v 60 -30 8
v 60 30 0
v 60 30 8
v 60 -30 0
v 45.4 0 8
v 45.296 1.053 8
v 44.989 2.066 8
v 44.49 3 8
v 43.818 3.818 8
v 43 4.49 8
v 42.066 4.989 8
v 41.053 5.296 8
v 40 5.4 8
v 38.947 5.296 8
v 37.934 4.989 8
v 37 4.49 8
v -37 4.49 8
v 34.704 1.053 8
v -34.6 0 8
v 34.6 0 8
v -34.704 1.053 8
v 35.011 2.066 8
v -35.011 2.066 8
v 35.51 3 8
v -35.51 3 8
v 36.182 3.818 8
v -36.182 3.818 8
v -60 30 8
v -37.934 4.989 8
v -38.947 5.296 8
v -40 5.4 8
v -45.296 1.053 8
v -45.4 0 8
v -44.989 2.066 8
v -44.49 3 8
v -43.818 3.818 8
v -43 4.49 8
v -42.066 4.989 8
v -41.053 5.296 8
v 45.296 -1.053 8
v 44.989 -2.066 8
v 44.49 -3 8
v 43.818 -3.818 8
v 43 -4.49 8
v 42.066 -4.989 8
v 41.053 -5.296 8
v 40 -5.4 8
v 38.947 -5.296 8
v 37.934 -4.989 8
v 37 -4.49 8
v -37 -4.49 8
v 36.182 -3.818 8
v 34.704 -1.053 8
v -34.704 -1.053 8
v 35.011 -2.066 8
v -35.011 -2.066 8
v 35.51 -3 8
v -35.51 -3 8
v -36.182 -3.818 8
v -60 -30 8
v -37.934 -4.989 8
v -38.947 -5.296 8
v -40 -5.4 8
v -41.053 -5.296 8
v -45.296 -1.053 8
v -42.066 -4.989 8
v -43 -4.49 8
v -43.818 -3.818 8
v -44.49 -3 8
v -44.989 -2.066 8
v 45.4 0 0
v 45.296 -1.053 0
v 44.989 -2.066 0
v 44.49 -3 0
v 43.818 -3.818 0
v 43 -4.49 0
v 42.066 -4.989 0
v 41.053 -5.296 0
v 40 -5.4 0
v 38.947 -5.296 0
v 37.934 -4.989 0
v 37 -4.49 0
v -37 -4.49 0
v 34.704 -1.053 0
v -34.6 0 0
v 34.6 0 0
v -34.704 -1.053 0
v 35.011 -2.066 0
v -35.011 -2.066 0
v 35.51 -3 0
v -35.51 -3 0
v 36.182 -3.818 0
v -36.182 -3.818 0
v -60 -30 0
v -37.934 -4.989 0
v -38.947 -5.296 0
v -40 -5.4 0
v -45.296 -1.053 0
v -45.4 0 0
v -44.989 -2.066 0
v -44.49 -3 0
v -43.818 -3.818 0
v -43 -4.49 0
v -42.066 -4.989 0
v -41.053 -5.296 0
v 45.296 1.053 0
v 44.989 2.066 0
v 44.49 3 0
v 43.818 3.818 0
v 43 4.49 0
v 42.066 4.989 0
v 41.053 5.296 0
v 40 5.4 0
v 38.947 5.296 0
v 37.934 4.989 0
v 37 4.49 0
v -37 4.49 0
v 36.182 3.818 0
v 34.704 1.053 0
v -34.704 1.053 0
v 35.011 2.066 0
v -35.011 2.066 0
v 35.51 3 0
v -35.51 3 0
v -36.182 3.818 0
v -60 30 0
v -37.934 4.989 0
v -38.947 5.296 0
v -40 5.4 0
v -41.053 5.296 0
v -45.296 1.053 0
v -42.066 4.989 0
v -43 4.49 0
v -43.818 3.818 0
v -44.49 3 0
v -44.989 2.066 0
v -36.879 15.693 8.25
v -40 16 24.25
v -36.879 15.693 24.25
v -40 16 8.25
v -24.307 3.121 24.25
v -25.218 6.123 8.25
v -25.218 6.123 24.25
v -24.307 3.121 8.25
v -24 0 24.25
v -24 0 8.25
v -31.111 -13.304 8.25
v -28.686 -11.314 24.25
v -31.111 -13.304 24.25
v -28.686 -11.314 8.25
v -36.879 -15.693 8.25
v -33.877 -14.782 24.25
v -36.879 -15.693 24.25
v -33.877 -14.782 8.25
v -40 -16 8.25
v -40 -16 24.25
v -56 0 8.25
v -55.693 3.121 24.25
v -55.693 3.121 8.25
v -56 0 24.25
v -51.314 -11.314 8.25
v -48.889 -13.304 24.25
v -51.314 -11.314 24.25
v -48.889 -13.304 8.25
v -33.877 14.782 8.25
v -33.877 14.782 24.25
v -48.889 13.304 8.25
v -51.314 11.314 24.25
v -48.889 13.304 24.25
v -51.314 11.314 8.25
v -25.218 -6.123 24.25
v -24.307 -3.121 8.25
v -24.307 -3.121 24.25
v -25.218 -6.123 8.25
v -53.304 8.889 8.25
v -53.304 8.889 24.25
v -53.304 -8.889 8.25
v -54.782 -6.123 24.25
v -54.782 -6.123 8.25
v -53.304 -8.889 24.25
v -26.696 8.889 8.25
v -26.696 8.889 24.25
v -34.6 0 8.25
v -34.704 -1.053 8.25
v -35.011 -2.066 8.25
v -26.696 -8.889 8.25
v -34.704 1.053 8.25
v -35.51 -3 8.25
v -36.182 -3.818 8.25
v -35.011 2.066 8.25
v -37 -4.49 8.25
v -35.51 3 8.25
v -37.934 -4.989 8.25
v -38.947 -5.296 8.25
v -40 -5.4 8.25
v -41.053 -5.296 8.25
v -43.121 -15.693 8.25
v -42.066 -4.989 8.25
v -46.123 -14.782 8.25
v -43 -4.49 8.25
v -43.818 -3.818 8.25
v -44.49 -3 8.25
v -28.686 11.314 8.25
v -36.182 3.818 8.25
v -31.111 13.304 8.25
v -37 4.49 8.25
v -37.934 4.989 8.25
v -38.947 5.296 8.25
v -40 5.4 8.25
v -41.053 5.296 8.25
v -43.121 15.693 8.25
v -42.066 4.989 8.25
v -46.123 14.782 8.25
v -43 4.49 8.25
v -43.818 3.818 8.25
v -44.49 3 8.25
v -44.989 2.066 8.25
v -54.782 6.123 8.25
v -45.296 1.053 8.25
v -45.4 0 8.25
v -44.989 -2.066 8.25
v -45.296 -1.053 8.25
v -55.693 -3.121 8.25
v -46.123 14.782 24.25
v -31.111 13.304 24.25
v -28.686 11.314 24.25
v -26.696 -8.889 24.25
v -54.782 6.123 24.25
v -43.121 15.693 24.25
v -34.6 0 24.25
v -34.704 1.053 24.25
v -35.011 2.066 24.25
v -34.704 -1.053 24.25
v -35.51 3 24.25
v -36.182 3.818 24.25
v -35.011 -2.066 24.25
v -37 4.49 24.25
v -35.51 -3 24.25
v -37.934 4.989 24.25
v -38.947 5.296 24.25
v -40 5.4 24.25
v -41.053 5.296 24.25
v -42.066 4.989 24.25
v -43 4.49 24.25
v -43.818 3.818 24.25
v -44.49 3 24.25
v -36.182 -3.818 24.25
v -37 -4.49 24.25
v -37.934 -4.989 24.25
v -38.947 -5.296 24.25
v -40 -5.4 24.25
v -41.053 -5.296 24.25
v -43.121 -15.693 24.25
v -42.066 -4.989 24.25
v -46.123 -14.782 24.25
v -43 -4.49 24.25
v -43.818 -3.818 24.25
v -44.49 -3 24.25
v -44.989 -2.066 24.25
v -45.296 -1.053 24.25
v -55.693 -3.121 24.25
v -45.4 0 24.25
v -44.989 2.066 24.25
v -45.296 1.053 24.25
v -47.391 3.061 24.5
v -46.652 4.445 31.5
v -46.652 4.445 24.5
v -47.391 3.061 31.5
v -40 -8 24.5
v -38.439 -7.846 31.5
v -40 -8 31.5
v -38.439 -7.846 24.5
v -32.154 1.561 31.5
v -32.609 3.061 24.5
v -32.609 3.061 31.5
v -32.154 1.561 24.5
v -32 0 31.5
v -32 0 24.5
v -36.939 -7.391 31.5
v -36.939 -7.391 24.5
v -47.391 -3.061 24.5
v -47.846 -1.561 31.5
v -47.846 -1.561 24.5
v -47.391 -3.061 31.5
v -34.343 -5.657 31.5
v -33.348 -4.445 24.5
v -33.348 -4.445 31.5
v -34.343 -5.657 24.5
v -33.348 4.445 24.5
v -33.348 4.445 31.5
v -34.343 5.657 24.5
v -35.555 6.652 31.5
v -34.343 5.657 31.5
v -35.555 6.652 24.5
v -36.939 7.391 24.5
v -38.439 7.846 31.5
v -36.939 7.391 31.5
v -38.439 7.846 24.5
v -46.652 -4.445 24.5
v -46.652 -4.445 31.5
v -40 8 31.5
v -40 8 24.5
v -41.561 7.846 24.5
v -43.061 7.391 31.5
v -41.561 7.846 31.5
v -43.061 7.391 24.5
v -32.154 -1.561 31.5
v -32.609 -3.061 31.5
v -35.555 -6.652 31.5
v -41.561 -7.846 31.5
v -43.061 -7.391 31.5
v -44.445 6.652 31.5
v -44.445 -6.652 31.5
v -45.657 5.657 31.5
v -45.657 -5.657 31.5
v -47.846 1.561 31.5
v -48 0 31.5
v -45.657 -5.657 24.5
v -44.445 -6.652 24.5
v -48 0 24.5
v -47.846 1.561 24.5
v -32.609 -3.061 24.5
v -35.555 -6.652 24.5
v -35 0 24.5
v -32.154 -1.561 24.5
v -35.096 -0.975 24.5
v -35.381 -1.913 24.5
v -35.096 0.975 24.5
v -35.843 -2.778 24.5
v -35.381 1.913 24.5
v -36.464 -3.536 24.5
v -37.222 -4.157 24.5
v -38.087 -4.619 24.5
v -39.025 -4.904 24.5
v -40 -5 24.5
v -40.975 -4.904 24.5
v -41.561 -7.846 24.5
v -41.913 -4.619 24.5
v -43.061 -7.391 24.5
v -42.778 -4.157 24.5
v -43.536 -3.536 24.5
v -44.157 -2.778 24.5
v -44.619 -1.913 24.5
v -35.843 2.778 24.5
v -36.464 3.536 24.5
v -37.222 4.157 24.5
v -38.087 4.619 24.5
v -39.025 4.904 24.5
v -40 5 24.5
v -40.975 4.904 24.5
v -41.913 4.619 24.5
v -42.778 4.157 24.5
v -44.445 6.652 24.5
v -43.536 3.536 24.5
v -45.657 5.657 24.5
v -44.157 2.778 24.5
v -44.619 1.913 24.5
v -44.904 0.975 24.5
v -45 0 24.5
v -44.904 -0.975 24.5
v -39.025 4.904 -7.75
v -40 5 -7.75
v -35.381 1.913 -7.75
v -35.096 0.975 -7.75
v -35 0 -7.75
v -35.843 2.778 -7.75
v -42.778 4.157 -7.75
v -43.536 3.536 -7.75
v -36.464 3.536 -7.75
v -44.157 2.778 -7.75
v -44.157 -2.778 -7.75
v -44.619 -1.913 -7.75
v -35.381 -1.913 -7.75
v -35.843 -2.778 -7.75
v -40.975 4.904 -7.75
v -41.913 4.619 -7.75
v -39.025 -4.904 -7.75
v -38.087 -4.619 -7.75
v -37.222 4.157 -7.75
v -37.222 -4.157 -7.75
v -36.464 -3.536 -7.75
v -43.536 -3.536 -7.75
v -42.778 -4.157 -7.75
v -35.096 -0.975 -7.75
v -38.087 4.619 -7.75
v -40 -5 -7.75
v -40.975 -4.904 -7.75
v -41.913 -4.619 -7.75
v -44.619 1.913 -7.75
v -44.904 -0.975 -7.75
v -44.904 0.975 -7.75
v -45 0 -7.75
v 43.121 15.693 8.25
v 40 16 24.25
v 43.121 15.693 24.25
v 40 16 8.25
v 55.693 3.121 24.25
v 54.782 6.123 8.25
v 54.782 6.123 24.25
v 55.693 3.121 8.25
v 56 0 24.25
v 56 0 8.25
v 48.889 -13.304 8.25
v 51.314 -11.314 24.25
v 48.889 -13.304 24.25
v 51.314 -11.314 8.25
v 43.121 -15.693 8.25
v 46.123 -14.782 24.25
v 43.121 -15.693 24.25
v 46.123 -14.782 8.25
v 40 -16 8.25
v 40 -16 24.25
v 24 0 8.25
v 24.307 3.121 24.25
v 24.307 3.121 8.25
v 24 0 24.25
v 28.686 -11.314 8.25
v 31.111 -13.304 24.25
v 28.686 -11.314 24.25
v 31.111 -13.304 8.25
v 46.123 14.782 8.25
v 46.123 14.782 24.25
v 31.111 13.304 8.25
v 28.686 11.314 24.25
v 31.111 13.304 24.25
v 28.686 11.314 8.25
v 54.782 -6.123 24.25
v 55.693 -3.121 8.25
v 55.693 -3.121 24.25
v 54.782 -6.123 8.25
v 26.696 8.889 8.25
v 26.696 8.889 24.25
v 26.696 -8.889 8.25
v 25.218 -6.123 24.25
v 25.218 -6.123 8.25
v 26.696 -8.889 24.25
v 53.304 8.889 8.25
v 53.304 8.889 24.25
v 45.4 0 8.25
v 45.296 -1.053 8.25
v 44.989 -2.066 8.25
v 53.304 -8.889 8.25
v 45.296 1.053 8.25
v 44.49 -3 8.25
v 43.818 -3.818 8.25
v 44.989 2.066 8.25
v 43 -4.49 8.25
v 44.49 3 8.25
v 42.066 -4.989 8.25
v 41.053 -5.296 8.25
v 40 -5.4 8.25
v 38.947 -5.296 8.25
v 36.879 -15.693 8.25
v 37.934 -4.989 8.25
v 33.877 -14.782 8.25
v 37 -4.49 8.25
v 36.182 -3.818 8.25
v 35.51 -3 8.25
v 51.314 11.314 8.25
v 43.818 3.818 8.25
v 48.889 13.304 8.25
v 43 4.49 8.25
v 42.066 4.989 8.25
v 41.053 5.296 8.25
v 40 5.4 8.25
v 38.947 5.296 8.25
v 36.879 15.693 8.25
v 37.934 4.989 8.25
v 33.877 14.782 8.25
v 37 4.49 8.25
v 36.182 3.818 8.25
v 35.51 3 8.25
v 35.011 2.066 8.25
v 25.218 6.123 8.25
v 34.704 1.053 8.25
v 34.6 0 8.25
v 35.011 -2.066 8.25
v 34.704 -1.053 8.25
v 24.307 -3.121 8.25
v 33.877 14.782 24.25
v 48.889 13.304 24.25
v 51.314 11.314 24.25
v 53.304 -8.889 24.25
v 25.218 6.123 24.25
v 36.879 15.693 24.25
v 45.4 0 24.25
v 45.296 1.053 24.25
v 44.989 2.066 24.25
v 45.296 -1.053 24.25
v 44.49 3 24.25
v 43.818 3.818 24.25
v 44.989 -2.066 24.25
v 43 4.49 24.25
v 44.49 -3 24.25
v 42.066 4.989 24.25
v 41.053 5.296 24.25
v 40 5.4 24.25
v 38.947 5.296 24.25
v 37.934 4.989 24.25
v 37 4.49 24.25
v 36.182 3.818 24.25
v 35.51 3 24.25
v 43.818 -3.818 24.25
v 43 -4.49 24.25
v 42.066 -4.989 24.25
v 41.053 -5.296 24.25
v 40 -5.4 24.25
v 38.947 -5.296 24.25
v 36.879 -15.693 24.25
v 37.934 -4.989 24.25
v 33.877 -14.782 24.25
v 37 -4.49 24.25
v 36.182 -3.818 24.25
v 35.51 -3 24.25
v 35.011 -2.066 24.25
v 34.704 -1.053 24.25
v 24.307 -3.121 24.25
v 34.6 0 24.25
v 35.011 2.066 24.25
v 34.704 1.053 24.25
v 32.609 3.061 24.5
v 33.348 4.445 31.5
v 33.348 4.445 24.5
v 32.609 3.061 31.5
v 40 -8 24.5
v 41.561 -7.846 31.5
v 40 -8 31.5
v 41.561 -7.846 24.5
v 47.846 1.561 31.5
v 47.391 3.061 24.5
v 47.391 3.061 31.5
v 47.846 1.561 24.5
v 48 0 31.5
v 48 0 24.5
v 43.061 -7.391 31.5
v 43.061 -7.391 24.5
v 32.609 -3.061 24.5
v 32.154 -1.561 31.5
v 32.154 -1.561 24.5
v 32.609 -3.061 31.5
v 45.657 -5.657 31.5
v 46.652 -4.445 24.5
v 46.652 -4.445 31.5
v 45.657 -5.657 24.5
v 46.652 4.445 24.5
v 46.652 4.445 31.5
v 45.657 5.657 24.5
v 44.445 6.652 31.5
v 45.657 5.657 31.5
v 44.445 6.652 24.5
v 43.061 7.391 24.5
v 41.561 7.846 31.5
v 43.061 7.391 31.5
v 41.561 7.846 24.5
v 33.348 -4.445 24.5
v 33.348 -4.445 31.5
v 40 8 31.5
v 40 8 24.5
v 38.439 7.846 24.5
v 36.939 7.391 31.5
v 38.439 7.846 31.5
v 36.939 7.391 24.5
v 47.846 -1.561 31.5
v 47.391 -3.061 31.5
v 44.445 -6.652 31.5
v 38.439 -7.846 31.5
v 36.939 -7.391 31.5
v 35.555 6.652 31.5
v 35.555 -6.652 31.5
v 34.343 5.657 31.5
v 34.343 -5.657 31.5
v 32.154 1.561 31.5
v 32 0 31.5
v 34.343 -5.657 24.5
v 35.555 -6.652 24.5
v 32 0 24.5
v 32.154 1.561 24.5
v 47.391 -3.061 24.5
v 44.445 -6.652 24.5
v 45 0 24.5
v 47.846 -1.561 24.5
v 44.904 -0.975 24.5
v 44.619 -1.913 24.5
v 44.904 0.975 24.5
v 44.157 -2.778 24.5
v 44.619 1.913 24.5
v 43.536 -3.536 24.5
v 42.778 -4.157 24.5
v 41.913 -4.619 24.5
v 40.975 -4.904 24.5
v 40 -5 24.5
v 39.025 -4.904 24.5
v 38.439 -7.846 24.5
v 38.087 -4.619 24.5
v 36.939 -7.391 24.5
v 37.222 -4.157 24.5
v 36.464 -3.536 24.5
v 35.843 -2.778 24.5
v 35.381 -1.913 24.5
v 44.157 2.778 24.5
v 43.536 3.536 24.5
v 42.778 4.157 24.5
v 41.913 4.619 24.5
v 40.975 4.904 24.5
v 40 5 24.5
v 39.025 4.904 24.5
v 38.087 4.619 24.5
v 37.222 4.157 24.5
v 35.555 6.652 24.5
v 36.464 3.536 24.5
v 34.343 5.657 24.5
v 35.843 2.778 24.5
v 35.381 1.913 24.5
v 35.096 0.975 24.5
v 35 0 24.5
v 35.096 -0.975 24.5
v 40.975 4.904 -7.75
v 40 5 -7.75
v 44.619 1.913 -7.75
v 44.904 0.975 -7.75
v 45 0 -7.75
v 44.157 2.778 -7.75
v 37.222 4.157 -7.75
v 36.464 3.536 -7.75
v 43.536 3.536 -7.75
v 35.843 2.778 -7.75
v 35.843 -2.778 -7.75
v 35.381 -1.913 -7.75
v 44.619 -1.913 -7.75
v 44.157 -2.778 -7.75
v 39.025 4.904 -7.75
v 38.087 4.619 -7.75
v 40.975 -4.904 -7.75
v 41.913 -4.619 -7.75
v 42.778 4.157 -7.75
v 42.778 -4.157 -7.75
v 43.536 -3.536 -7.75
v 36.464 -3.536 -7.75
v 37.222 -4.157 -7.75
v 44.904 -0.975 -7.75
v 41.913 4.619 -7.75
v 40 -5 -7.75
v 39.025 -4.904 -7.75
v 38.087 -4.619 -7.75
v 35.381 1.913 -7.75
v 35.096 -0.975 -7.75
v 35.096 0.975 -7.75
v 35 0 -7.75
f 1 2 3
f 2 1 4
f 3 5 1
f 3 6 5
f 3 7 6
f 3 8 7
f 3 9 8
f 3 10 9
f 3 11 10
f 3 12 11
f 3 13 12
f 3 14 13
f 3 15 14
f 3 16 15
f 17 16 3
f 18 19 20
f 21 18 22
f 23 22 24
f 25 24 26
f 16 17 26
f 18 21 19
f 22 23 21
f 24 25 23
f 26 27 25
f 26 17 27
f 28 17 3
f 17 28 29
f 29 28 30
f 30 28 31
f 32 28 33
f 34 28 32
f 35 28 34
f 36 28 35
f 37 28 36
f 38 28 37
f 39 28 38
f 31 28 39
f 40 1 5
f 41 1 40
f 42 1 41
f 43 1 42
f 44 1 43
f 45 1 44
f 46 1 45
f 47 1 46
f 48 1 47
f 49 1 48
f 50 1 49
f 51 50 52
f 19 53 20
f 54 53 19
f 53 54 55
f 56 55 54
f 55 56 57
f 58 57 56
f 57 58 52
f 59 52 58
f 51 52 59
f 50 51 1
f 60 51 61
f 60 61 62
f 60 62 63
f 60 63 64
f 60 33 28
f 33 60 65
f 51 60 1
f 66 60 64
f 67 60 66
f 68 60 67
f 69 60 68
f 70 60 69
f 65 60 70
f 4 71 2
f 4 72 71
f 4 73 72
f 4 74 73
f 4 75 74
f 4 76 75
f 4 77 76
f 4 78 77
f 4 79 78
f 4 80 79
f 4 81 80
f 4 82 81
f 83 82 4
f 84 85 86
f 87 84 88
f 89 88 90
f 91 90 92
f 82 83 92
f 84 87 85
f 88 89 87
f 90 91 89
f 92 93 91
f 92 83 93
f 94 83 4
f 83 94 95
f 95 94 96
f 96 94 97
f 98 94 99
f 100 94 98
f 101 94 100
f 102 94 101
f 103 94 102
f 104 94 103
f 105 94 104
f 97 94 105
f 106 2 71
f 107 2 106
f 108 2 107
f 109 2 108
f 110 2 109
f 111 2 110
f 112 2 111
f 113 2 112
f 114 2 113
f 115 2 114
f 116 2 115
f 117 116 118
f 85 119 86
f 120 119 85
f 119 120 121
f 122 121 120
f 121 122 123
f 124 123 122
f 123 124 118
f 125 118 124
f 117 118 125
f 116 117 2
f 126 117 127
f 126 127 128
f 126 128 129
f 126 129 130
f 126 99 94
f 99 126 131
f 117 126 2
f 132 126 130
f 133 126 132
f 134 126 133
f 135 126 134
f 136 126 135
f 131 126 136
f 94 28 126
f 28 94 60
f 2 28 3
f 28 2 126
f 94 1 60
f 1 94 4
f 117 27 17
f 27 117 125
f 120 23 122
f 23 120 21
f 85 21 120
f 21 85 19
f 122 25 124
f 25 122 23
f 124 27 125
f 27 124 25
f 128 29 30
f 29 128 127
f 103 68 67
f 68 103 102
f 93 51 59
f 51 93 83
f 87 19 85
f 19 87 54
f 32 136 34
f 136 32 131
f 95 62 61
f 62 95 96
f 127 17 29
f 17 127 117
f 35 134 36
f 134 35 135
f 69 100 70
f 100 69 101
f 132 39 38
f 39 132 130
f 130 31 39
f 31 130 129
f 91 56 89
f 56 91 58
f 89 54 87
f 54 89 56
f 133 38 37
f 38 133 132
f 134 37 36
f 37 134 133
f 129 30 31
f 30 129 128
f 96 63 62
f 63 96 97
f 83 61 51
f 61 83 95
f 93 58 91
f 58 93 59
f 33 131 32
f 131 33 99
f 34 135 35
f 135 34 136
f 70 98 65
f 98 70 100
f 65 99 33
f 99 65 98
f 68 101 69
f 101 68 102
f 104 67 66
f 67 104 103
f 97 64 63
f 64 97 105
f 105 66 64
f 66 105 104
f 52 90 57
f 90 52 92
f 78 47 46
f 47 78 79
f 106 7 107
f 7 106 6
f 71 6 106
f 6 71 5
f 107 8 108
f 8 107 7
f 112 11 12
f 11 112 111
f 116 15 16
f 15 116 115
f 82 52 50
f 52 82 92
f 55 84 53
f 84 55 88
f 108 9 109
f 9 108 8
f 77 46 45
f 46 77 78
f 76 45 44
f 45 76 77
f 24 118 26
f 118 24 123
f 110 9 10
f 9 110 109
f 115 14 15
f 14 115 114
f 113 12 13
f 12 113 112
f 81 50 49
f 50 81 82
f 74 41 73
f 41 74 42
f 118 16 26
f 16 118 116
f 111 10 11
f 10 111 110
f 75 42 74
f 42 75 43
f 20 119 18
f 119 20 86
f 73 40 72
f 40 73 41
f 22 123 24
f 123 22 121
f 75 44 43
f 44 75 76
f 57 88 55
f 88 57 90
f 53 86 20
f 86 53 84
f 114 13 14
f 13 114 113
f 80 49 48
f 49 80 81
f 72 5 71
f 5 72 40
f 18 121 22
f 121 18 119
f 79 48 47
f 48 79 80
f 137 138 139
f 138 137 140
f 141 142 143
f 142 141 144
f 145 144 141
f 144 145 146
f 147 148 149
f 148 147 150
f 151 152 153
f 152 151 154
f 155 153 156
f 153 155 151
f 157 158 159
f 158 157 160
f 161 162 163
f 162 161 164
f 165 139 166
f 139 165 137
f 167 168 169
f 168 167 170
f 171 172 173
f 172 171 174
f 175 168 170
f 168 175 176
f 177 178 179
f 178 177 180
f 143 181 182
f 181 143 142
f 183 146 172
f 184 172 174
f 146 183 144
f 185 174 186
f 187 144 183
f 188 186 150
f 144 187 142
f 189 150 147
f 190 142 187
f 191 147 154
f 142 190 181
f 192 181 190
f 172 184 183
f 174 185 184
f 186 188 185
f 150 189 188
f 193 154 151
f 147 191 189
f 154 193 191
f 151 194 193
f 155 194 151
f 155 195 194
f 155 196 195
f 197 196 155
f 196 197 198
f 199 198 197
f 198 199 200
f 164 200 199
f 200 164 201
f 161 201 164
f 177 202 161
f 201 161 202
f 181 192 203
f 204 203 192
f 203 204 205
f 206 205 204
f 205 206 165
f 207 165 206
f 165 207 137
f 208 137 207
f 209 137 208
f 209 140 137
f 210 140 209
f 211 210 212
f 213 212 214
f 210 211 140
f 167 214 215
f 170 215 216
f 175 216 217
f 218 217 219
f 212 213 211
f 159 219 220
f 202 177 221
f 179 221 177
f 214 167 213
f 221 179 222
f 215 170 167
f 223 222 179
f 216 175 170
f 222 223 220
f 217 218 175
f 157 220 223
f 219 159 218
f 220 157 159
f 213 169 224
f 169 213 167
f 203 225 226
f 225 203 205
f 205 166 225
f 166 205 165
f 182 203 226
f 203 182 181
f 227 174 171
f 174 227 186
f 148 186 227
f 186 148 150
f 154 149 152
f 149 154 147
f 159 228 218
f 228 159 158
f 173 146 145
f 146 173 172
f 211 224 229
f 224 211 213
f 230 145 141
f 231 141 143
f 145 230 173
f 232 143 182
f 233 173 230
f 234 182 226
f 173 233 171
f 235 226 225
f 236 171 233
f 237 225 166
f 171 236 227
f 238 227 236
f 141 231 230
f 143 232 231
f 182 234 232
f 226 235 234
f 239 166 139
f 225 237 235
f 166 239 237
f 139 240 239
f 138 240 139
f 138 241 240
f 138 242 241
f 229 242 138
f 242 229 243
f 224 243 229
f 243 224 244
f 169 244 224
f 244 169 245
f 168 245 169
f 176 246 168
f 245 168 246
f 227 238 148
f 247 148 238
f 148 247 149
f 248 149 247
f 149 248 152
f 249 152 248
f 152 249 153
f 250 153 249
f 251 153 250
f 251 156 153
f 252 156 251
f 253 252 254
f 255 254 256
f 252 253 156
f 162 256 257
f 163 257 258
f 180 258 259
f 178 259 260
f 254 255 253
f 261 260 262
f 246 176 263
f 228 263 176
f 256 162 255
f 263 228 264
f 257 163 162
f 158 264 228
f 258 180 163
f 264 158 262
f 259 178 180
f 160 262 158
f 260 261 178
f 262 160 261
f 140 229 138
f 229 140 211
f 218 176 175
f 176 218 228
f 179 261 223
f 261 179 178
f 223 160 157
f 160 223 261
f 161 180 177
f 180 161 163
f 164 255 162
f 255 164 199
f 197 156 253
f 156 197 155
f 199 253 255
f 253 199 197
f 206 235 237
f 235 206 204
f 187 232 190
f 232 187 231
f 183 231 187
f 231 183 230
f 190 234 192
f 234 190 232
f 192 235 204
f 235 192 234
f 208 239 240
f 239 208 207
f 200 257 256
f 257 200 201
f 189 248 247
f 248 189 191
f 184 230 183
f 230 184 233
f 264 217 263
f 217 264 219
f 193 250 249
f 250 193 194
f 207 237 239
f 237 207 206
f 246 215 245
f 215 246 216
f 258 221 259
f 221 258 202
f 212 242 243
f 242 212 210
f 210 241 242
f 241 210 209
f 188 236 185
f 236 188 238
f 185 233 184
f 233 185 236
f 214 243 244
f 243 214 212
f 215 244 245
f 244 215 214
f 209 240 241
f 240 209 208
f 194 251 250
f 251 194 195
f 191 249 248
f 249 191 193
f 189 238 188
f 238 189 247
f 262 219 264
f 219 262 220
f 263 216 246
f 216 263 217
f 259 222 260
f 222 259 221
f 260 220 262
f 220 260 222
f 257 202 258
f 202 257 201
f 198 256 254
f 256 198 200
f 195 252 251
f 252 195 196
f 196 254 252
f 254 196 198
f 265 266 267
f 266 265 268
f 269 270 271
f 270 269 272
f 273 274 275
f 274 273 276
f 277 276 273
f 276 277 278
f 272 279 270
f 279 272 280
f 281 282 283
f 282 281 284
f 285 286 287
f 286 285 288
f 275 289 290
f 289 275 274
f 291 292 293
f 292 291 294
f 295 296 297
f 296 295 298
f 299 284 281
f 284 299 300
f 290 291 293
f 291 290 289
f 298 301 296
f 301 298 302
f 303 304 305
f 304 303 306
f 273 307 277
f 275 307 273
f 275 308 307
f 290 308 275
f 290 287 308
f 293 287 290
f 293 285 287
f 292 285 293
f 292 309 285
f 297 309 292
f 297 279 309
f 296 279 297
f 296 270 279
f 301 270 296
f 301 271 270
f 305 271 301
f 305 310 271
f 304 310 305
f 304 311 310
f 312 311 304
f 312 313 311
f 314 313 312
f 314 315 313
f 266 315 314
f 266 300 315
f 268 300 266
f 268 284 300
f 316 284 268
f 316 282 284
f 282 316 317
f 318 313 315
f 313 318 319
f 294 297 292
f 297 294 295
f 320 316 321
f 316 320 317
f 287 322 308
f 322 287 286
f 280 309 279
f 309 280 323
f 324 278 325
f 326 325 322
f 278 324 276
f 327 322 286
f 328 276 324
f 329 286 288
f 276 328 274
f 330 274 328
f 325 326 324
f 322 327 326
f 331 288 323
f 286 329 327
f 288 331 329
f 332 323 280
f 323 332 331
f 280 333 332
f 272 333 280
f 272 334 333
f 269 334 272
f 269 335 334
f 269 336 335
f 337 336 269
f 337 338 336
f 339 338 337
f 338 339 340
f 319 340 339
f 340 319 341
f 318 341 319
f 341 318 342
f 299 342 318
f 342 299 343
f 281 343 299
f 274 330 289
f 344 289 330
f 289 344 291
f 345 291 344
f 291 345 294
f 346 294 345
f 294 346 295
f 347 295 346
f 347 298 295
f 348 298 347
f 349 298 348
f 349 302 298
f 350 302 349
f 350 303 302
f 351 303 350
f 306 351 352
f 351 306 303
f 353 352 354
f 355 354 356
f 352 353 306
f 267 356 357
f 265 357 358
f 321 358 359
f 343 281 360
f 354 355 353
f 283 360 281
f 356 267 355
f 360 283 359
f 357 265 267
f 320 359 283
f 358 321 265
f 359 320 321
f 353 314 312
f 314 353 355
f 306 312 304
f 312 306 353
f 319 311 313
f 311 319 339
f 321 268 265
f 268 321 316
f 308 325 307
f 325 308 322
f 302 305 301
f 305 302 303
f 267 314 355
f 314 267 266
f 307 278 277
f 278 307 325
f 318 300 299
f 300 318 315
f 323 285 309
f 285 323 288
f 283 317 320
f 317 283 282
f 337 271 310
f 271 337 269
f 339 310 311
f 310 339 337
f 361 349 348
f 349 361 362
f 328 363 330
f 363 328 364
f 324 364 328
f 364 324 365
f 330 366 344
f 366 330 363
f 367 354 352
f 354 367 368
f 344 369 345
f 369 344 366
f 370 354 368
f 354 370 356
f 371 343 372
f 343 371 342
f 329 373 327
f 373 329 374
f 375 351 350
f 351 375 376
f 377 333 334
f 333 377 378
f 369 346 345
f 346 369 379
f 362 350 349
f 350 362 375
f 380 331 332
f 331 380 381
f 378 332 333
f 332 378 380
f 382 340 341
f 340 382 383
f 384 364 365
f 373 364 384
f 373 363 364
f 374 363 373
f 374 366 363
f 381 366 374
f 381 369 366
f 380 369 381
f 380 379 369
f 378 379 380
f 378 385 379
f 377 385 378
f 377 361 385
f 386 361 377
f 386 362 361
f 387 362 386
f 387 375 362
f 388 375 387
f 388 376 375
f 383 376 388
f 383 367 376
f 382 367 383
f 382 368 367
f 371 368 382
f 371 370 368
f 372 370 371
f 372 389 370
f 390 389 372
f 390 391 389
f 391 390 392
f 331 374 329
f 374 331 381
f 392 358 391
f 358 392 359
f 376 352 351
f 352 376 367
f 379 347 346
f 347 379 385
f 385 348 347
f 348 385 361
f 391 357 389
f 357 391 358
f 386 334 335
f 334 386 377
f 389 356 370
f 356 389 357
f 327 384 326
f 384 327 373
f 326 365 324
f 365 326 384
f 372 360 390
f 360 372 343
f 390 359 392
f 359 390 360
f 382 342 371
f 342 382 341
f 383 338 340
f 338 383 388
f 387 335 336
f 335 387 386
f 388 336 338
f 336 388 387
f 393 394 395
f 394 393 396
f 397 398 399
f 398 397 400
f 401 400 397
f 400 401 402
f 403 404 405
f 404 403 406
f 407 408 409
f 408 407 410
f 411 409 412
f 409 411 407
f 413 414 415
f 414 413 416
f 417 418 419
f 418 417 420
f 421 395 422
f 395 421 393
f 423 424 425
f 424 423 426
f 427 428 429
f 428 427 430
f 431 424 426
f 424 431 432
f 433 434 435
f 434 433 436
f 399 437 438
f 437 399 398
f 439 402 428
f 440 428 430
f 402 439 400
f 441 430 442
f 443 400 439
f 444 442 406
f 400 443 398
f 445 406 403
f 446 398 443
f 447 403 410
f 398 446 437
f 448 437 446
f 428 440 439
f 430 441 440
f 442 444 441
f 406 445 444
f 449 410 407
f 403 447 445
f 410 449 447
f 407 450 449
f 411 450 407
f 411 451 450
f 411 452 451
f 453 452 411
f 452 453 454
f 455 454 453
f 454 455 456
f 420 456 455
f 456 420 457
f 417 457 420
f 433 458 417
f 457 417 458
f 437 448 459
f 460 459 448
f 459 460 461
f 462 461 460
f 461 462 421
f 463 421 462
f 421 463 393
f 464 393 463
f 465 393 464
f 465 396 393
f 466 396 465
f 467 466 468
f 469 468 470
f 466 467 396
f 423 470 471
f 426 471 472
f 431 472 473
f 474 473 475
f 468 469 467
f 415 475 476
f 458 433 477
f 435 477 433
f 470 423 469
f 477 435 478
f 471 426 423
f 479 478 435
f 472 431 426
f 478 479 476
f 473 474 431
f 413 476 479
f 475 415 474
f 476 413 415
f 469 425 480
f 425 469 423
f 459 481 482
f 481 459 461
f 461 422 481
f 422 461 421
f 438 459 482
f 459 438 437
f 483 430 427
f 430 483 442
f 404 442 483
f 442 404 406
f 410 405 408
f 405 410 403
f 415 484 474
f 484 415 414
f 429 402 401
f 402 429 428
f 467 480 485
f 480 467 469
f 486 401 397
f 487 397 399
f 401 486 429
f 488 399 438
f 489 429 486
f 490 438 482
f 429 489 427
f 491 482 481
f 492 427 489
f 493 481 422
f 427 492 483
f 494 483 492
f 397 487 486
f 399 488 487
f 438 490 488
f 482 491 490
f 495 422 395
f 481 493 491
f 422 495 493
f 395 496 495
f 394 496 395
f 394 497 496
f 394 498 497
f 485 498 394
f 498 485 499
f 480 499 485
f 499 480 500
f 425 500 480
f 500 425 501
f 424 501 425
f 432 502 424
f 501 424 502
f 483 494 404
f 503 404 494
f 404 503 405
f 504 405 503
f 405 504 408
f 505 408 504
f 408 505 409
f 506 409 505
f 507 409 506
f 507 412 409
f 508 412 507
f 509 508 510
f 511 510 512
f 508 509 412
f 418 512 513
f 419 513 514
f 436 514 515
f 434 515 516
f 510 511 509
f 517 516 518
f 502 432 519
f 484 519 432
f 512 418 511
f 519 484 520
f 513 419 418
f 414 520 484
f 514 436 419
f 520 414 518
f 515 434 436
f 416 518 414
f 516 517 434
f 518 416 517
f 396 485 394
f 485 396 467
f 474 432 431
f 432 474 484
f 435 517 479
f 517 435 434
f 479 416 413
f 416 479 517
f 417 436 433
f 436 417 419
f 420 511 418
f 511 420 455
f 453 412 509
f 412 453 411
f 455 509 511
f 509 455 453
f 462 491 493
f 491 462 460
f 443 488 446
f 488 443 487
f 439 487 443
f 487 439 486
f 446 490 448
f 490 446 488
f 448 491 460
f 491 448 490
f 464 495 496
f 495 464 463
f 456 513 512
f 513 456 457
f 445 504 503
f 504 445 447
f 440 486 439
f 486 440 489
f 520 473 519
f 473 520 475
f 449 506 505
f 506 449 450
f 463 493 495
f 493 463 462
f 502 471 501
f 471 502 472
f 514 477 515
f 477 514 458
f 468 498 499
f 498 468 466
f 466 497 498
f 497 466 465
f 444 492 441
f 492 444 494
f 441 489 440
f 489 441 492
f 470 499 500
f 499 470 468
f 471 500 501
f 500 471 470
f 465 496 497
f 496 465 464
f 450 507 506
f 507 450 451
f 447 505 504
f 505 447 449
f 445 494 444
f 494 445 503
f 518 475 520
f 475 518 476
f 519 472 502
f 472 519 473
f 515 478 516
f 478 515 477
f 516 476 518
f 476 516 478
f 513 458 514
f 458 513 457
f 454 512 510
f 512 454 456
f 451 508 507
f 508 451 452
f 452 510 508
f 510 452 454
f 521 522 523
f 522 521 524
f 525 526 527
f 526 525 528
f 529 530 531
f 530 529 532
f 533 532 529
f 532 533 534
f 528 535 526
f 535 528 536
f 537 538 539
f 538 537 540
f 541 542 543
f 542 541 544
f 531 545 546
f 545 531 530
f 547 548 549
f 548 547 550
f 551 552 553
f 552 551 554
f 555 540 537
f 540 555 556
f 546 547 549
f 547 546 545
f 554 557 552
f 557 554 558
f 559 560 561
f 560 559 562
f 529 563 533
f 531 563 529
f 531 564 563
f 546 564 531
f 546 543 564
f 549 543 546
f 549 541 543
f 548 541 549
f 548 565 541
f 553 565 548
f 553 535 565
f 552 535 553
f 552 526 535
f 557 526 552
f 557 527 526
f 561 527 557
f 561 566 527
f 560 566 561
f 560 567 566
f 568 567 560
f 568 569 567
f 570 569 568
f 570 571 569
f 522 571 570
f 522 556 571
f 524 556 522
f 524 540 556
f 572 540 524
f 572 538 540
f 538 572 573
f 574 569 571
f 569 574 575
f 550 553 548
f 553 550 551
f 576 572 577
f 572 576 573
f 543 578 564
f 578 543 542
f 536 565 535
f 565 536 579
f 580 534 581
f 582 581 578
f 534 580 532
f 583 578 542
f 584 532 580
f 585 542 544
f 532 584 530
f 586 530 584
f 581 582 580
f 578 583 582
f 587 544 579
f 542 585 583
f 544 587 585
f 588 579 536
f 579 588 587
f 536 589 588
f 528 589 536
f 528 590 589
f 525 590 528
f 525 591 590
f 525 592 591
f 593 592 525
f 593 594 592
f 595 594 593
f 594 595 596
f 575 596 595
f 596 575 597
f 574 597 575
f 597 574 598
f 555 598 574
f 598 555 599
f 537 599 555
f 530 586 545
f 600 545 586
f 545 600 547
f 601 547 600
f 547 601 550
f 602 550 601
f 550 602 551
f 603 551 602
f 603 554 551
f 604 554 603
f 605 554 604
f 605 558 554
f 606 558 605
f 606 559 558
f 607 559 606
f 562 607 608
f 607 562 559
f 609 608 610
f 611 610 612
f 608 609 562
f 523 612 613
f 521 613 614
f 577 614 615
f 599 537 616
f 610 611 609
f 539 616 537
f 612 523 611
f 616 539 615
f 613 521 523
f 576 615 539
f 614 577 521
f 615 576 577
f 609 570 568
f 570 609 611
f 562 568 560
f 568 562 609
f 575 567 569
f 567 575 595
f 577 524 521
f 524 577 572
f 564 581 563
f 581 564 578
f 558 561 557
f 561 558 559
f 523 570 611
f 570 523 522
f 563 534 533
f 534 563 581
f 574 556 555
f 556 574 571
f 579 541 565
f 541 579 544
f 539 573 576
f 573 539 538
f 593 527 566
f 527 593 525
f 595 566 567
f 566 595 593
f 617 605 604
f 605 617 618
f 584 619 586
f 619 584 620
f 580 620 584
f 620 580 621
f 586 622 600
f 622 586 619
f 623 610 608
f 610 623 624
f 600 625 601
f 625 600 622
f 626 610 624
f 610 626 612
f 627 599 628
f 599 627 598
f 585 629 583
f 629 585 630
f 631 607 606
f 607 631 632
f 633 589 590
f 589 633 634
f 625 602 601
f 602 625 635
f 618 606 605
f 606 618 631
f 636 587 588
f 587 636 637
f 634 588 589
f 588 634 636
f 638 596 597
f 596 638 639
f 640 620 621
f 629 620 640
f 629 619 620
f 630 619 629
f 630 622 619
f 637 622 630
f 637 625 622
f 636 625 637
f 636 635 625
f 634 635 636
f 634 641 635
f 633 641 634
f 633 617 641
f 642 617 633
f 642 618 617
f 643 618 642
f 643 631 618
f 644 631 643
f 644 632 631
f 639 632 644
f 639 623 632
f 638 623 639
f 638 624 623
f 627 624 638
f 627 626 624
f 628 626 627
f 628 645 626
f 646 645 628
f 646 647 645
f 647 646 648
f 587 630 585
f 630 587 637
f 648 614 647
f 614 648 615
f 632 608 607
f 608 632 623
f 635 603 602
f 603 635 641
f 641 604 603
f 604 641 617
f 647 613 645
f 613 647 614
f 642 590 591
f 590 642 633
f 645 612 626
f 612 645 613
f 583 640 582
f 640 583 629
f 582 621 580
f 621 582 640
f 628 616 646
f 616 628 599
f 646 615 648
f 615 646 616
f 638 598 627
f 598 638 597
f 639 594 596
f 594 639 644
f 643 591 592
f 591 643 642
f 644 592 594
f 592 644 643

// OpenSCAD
$fn = 32;

// ------------------------------------------------------------------------
// Standoff columns: 2 d32 standoffs, bolts d10
// Every part is its own module, assembly() places them once.
// ------------------------------------------------------------------------

// --- part 1 ---
module base_plate() {
  difference() {
    translate([-60, -30, 0]) cube([120, 60, 8]);
    translate([-40, 0, -1]) cylinder(h = 10, d = 10.8);
    translate([40, 0, -1]) cylinder(h = 10, d = 10.8);
  }
}

// --- part 2 ---
module spacer1() {
  difference() {
      translate([0, 0, 0]) cylinder(h = 16, d = 32);
      translate([0, 0, -1]) cylinder(h = 18, d = 10.8);
    }
}

// --- part 3 ---
module bolt1() {
  cylinder(h = 7, d = 16);
  translate([0, 0, -32.25]) cylinder(h = 32.25, d = 10);
}

// --- part 4 ---
module spacer2() {
  difference() {
      translate([0, 0, 0]) cylinder(h = 16, d = 32);
      translate([0, 0, -1]) cylinder(h = 18, d = 10.8);
    }
}

// --- part 5 ---
module bolt2() {
  cylinder(h = 7, d = 16);
  translate([0, 0, -32.25]) cylinder(h = 32.25, d = 10);
}

// --- assembly ---
module assembly() {
  translate([0, 0, 0]) rotate([0, 0, 0]) base_plate();
  translate([-40, 0, 8.25]) rotate([0, 0, 0]) spacer1();
  translate([-40, 0, 24.5]) rotate([0, 0, 0]) bolt1();
  translate([40, 0, 8.25]) rotate([0, 0, 0]) spacer2();
  translate([40, 0, 24.5]) rotate([0, 0, 0]) bolt2();
}

assembly();
